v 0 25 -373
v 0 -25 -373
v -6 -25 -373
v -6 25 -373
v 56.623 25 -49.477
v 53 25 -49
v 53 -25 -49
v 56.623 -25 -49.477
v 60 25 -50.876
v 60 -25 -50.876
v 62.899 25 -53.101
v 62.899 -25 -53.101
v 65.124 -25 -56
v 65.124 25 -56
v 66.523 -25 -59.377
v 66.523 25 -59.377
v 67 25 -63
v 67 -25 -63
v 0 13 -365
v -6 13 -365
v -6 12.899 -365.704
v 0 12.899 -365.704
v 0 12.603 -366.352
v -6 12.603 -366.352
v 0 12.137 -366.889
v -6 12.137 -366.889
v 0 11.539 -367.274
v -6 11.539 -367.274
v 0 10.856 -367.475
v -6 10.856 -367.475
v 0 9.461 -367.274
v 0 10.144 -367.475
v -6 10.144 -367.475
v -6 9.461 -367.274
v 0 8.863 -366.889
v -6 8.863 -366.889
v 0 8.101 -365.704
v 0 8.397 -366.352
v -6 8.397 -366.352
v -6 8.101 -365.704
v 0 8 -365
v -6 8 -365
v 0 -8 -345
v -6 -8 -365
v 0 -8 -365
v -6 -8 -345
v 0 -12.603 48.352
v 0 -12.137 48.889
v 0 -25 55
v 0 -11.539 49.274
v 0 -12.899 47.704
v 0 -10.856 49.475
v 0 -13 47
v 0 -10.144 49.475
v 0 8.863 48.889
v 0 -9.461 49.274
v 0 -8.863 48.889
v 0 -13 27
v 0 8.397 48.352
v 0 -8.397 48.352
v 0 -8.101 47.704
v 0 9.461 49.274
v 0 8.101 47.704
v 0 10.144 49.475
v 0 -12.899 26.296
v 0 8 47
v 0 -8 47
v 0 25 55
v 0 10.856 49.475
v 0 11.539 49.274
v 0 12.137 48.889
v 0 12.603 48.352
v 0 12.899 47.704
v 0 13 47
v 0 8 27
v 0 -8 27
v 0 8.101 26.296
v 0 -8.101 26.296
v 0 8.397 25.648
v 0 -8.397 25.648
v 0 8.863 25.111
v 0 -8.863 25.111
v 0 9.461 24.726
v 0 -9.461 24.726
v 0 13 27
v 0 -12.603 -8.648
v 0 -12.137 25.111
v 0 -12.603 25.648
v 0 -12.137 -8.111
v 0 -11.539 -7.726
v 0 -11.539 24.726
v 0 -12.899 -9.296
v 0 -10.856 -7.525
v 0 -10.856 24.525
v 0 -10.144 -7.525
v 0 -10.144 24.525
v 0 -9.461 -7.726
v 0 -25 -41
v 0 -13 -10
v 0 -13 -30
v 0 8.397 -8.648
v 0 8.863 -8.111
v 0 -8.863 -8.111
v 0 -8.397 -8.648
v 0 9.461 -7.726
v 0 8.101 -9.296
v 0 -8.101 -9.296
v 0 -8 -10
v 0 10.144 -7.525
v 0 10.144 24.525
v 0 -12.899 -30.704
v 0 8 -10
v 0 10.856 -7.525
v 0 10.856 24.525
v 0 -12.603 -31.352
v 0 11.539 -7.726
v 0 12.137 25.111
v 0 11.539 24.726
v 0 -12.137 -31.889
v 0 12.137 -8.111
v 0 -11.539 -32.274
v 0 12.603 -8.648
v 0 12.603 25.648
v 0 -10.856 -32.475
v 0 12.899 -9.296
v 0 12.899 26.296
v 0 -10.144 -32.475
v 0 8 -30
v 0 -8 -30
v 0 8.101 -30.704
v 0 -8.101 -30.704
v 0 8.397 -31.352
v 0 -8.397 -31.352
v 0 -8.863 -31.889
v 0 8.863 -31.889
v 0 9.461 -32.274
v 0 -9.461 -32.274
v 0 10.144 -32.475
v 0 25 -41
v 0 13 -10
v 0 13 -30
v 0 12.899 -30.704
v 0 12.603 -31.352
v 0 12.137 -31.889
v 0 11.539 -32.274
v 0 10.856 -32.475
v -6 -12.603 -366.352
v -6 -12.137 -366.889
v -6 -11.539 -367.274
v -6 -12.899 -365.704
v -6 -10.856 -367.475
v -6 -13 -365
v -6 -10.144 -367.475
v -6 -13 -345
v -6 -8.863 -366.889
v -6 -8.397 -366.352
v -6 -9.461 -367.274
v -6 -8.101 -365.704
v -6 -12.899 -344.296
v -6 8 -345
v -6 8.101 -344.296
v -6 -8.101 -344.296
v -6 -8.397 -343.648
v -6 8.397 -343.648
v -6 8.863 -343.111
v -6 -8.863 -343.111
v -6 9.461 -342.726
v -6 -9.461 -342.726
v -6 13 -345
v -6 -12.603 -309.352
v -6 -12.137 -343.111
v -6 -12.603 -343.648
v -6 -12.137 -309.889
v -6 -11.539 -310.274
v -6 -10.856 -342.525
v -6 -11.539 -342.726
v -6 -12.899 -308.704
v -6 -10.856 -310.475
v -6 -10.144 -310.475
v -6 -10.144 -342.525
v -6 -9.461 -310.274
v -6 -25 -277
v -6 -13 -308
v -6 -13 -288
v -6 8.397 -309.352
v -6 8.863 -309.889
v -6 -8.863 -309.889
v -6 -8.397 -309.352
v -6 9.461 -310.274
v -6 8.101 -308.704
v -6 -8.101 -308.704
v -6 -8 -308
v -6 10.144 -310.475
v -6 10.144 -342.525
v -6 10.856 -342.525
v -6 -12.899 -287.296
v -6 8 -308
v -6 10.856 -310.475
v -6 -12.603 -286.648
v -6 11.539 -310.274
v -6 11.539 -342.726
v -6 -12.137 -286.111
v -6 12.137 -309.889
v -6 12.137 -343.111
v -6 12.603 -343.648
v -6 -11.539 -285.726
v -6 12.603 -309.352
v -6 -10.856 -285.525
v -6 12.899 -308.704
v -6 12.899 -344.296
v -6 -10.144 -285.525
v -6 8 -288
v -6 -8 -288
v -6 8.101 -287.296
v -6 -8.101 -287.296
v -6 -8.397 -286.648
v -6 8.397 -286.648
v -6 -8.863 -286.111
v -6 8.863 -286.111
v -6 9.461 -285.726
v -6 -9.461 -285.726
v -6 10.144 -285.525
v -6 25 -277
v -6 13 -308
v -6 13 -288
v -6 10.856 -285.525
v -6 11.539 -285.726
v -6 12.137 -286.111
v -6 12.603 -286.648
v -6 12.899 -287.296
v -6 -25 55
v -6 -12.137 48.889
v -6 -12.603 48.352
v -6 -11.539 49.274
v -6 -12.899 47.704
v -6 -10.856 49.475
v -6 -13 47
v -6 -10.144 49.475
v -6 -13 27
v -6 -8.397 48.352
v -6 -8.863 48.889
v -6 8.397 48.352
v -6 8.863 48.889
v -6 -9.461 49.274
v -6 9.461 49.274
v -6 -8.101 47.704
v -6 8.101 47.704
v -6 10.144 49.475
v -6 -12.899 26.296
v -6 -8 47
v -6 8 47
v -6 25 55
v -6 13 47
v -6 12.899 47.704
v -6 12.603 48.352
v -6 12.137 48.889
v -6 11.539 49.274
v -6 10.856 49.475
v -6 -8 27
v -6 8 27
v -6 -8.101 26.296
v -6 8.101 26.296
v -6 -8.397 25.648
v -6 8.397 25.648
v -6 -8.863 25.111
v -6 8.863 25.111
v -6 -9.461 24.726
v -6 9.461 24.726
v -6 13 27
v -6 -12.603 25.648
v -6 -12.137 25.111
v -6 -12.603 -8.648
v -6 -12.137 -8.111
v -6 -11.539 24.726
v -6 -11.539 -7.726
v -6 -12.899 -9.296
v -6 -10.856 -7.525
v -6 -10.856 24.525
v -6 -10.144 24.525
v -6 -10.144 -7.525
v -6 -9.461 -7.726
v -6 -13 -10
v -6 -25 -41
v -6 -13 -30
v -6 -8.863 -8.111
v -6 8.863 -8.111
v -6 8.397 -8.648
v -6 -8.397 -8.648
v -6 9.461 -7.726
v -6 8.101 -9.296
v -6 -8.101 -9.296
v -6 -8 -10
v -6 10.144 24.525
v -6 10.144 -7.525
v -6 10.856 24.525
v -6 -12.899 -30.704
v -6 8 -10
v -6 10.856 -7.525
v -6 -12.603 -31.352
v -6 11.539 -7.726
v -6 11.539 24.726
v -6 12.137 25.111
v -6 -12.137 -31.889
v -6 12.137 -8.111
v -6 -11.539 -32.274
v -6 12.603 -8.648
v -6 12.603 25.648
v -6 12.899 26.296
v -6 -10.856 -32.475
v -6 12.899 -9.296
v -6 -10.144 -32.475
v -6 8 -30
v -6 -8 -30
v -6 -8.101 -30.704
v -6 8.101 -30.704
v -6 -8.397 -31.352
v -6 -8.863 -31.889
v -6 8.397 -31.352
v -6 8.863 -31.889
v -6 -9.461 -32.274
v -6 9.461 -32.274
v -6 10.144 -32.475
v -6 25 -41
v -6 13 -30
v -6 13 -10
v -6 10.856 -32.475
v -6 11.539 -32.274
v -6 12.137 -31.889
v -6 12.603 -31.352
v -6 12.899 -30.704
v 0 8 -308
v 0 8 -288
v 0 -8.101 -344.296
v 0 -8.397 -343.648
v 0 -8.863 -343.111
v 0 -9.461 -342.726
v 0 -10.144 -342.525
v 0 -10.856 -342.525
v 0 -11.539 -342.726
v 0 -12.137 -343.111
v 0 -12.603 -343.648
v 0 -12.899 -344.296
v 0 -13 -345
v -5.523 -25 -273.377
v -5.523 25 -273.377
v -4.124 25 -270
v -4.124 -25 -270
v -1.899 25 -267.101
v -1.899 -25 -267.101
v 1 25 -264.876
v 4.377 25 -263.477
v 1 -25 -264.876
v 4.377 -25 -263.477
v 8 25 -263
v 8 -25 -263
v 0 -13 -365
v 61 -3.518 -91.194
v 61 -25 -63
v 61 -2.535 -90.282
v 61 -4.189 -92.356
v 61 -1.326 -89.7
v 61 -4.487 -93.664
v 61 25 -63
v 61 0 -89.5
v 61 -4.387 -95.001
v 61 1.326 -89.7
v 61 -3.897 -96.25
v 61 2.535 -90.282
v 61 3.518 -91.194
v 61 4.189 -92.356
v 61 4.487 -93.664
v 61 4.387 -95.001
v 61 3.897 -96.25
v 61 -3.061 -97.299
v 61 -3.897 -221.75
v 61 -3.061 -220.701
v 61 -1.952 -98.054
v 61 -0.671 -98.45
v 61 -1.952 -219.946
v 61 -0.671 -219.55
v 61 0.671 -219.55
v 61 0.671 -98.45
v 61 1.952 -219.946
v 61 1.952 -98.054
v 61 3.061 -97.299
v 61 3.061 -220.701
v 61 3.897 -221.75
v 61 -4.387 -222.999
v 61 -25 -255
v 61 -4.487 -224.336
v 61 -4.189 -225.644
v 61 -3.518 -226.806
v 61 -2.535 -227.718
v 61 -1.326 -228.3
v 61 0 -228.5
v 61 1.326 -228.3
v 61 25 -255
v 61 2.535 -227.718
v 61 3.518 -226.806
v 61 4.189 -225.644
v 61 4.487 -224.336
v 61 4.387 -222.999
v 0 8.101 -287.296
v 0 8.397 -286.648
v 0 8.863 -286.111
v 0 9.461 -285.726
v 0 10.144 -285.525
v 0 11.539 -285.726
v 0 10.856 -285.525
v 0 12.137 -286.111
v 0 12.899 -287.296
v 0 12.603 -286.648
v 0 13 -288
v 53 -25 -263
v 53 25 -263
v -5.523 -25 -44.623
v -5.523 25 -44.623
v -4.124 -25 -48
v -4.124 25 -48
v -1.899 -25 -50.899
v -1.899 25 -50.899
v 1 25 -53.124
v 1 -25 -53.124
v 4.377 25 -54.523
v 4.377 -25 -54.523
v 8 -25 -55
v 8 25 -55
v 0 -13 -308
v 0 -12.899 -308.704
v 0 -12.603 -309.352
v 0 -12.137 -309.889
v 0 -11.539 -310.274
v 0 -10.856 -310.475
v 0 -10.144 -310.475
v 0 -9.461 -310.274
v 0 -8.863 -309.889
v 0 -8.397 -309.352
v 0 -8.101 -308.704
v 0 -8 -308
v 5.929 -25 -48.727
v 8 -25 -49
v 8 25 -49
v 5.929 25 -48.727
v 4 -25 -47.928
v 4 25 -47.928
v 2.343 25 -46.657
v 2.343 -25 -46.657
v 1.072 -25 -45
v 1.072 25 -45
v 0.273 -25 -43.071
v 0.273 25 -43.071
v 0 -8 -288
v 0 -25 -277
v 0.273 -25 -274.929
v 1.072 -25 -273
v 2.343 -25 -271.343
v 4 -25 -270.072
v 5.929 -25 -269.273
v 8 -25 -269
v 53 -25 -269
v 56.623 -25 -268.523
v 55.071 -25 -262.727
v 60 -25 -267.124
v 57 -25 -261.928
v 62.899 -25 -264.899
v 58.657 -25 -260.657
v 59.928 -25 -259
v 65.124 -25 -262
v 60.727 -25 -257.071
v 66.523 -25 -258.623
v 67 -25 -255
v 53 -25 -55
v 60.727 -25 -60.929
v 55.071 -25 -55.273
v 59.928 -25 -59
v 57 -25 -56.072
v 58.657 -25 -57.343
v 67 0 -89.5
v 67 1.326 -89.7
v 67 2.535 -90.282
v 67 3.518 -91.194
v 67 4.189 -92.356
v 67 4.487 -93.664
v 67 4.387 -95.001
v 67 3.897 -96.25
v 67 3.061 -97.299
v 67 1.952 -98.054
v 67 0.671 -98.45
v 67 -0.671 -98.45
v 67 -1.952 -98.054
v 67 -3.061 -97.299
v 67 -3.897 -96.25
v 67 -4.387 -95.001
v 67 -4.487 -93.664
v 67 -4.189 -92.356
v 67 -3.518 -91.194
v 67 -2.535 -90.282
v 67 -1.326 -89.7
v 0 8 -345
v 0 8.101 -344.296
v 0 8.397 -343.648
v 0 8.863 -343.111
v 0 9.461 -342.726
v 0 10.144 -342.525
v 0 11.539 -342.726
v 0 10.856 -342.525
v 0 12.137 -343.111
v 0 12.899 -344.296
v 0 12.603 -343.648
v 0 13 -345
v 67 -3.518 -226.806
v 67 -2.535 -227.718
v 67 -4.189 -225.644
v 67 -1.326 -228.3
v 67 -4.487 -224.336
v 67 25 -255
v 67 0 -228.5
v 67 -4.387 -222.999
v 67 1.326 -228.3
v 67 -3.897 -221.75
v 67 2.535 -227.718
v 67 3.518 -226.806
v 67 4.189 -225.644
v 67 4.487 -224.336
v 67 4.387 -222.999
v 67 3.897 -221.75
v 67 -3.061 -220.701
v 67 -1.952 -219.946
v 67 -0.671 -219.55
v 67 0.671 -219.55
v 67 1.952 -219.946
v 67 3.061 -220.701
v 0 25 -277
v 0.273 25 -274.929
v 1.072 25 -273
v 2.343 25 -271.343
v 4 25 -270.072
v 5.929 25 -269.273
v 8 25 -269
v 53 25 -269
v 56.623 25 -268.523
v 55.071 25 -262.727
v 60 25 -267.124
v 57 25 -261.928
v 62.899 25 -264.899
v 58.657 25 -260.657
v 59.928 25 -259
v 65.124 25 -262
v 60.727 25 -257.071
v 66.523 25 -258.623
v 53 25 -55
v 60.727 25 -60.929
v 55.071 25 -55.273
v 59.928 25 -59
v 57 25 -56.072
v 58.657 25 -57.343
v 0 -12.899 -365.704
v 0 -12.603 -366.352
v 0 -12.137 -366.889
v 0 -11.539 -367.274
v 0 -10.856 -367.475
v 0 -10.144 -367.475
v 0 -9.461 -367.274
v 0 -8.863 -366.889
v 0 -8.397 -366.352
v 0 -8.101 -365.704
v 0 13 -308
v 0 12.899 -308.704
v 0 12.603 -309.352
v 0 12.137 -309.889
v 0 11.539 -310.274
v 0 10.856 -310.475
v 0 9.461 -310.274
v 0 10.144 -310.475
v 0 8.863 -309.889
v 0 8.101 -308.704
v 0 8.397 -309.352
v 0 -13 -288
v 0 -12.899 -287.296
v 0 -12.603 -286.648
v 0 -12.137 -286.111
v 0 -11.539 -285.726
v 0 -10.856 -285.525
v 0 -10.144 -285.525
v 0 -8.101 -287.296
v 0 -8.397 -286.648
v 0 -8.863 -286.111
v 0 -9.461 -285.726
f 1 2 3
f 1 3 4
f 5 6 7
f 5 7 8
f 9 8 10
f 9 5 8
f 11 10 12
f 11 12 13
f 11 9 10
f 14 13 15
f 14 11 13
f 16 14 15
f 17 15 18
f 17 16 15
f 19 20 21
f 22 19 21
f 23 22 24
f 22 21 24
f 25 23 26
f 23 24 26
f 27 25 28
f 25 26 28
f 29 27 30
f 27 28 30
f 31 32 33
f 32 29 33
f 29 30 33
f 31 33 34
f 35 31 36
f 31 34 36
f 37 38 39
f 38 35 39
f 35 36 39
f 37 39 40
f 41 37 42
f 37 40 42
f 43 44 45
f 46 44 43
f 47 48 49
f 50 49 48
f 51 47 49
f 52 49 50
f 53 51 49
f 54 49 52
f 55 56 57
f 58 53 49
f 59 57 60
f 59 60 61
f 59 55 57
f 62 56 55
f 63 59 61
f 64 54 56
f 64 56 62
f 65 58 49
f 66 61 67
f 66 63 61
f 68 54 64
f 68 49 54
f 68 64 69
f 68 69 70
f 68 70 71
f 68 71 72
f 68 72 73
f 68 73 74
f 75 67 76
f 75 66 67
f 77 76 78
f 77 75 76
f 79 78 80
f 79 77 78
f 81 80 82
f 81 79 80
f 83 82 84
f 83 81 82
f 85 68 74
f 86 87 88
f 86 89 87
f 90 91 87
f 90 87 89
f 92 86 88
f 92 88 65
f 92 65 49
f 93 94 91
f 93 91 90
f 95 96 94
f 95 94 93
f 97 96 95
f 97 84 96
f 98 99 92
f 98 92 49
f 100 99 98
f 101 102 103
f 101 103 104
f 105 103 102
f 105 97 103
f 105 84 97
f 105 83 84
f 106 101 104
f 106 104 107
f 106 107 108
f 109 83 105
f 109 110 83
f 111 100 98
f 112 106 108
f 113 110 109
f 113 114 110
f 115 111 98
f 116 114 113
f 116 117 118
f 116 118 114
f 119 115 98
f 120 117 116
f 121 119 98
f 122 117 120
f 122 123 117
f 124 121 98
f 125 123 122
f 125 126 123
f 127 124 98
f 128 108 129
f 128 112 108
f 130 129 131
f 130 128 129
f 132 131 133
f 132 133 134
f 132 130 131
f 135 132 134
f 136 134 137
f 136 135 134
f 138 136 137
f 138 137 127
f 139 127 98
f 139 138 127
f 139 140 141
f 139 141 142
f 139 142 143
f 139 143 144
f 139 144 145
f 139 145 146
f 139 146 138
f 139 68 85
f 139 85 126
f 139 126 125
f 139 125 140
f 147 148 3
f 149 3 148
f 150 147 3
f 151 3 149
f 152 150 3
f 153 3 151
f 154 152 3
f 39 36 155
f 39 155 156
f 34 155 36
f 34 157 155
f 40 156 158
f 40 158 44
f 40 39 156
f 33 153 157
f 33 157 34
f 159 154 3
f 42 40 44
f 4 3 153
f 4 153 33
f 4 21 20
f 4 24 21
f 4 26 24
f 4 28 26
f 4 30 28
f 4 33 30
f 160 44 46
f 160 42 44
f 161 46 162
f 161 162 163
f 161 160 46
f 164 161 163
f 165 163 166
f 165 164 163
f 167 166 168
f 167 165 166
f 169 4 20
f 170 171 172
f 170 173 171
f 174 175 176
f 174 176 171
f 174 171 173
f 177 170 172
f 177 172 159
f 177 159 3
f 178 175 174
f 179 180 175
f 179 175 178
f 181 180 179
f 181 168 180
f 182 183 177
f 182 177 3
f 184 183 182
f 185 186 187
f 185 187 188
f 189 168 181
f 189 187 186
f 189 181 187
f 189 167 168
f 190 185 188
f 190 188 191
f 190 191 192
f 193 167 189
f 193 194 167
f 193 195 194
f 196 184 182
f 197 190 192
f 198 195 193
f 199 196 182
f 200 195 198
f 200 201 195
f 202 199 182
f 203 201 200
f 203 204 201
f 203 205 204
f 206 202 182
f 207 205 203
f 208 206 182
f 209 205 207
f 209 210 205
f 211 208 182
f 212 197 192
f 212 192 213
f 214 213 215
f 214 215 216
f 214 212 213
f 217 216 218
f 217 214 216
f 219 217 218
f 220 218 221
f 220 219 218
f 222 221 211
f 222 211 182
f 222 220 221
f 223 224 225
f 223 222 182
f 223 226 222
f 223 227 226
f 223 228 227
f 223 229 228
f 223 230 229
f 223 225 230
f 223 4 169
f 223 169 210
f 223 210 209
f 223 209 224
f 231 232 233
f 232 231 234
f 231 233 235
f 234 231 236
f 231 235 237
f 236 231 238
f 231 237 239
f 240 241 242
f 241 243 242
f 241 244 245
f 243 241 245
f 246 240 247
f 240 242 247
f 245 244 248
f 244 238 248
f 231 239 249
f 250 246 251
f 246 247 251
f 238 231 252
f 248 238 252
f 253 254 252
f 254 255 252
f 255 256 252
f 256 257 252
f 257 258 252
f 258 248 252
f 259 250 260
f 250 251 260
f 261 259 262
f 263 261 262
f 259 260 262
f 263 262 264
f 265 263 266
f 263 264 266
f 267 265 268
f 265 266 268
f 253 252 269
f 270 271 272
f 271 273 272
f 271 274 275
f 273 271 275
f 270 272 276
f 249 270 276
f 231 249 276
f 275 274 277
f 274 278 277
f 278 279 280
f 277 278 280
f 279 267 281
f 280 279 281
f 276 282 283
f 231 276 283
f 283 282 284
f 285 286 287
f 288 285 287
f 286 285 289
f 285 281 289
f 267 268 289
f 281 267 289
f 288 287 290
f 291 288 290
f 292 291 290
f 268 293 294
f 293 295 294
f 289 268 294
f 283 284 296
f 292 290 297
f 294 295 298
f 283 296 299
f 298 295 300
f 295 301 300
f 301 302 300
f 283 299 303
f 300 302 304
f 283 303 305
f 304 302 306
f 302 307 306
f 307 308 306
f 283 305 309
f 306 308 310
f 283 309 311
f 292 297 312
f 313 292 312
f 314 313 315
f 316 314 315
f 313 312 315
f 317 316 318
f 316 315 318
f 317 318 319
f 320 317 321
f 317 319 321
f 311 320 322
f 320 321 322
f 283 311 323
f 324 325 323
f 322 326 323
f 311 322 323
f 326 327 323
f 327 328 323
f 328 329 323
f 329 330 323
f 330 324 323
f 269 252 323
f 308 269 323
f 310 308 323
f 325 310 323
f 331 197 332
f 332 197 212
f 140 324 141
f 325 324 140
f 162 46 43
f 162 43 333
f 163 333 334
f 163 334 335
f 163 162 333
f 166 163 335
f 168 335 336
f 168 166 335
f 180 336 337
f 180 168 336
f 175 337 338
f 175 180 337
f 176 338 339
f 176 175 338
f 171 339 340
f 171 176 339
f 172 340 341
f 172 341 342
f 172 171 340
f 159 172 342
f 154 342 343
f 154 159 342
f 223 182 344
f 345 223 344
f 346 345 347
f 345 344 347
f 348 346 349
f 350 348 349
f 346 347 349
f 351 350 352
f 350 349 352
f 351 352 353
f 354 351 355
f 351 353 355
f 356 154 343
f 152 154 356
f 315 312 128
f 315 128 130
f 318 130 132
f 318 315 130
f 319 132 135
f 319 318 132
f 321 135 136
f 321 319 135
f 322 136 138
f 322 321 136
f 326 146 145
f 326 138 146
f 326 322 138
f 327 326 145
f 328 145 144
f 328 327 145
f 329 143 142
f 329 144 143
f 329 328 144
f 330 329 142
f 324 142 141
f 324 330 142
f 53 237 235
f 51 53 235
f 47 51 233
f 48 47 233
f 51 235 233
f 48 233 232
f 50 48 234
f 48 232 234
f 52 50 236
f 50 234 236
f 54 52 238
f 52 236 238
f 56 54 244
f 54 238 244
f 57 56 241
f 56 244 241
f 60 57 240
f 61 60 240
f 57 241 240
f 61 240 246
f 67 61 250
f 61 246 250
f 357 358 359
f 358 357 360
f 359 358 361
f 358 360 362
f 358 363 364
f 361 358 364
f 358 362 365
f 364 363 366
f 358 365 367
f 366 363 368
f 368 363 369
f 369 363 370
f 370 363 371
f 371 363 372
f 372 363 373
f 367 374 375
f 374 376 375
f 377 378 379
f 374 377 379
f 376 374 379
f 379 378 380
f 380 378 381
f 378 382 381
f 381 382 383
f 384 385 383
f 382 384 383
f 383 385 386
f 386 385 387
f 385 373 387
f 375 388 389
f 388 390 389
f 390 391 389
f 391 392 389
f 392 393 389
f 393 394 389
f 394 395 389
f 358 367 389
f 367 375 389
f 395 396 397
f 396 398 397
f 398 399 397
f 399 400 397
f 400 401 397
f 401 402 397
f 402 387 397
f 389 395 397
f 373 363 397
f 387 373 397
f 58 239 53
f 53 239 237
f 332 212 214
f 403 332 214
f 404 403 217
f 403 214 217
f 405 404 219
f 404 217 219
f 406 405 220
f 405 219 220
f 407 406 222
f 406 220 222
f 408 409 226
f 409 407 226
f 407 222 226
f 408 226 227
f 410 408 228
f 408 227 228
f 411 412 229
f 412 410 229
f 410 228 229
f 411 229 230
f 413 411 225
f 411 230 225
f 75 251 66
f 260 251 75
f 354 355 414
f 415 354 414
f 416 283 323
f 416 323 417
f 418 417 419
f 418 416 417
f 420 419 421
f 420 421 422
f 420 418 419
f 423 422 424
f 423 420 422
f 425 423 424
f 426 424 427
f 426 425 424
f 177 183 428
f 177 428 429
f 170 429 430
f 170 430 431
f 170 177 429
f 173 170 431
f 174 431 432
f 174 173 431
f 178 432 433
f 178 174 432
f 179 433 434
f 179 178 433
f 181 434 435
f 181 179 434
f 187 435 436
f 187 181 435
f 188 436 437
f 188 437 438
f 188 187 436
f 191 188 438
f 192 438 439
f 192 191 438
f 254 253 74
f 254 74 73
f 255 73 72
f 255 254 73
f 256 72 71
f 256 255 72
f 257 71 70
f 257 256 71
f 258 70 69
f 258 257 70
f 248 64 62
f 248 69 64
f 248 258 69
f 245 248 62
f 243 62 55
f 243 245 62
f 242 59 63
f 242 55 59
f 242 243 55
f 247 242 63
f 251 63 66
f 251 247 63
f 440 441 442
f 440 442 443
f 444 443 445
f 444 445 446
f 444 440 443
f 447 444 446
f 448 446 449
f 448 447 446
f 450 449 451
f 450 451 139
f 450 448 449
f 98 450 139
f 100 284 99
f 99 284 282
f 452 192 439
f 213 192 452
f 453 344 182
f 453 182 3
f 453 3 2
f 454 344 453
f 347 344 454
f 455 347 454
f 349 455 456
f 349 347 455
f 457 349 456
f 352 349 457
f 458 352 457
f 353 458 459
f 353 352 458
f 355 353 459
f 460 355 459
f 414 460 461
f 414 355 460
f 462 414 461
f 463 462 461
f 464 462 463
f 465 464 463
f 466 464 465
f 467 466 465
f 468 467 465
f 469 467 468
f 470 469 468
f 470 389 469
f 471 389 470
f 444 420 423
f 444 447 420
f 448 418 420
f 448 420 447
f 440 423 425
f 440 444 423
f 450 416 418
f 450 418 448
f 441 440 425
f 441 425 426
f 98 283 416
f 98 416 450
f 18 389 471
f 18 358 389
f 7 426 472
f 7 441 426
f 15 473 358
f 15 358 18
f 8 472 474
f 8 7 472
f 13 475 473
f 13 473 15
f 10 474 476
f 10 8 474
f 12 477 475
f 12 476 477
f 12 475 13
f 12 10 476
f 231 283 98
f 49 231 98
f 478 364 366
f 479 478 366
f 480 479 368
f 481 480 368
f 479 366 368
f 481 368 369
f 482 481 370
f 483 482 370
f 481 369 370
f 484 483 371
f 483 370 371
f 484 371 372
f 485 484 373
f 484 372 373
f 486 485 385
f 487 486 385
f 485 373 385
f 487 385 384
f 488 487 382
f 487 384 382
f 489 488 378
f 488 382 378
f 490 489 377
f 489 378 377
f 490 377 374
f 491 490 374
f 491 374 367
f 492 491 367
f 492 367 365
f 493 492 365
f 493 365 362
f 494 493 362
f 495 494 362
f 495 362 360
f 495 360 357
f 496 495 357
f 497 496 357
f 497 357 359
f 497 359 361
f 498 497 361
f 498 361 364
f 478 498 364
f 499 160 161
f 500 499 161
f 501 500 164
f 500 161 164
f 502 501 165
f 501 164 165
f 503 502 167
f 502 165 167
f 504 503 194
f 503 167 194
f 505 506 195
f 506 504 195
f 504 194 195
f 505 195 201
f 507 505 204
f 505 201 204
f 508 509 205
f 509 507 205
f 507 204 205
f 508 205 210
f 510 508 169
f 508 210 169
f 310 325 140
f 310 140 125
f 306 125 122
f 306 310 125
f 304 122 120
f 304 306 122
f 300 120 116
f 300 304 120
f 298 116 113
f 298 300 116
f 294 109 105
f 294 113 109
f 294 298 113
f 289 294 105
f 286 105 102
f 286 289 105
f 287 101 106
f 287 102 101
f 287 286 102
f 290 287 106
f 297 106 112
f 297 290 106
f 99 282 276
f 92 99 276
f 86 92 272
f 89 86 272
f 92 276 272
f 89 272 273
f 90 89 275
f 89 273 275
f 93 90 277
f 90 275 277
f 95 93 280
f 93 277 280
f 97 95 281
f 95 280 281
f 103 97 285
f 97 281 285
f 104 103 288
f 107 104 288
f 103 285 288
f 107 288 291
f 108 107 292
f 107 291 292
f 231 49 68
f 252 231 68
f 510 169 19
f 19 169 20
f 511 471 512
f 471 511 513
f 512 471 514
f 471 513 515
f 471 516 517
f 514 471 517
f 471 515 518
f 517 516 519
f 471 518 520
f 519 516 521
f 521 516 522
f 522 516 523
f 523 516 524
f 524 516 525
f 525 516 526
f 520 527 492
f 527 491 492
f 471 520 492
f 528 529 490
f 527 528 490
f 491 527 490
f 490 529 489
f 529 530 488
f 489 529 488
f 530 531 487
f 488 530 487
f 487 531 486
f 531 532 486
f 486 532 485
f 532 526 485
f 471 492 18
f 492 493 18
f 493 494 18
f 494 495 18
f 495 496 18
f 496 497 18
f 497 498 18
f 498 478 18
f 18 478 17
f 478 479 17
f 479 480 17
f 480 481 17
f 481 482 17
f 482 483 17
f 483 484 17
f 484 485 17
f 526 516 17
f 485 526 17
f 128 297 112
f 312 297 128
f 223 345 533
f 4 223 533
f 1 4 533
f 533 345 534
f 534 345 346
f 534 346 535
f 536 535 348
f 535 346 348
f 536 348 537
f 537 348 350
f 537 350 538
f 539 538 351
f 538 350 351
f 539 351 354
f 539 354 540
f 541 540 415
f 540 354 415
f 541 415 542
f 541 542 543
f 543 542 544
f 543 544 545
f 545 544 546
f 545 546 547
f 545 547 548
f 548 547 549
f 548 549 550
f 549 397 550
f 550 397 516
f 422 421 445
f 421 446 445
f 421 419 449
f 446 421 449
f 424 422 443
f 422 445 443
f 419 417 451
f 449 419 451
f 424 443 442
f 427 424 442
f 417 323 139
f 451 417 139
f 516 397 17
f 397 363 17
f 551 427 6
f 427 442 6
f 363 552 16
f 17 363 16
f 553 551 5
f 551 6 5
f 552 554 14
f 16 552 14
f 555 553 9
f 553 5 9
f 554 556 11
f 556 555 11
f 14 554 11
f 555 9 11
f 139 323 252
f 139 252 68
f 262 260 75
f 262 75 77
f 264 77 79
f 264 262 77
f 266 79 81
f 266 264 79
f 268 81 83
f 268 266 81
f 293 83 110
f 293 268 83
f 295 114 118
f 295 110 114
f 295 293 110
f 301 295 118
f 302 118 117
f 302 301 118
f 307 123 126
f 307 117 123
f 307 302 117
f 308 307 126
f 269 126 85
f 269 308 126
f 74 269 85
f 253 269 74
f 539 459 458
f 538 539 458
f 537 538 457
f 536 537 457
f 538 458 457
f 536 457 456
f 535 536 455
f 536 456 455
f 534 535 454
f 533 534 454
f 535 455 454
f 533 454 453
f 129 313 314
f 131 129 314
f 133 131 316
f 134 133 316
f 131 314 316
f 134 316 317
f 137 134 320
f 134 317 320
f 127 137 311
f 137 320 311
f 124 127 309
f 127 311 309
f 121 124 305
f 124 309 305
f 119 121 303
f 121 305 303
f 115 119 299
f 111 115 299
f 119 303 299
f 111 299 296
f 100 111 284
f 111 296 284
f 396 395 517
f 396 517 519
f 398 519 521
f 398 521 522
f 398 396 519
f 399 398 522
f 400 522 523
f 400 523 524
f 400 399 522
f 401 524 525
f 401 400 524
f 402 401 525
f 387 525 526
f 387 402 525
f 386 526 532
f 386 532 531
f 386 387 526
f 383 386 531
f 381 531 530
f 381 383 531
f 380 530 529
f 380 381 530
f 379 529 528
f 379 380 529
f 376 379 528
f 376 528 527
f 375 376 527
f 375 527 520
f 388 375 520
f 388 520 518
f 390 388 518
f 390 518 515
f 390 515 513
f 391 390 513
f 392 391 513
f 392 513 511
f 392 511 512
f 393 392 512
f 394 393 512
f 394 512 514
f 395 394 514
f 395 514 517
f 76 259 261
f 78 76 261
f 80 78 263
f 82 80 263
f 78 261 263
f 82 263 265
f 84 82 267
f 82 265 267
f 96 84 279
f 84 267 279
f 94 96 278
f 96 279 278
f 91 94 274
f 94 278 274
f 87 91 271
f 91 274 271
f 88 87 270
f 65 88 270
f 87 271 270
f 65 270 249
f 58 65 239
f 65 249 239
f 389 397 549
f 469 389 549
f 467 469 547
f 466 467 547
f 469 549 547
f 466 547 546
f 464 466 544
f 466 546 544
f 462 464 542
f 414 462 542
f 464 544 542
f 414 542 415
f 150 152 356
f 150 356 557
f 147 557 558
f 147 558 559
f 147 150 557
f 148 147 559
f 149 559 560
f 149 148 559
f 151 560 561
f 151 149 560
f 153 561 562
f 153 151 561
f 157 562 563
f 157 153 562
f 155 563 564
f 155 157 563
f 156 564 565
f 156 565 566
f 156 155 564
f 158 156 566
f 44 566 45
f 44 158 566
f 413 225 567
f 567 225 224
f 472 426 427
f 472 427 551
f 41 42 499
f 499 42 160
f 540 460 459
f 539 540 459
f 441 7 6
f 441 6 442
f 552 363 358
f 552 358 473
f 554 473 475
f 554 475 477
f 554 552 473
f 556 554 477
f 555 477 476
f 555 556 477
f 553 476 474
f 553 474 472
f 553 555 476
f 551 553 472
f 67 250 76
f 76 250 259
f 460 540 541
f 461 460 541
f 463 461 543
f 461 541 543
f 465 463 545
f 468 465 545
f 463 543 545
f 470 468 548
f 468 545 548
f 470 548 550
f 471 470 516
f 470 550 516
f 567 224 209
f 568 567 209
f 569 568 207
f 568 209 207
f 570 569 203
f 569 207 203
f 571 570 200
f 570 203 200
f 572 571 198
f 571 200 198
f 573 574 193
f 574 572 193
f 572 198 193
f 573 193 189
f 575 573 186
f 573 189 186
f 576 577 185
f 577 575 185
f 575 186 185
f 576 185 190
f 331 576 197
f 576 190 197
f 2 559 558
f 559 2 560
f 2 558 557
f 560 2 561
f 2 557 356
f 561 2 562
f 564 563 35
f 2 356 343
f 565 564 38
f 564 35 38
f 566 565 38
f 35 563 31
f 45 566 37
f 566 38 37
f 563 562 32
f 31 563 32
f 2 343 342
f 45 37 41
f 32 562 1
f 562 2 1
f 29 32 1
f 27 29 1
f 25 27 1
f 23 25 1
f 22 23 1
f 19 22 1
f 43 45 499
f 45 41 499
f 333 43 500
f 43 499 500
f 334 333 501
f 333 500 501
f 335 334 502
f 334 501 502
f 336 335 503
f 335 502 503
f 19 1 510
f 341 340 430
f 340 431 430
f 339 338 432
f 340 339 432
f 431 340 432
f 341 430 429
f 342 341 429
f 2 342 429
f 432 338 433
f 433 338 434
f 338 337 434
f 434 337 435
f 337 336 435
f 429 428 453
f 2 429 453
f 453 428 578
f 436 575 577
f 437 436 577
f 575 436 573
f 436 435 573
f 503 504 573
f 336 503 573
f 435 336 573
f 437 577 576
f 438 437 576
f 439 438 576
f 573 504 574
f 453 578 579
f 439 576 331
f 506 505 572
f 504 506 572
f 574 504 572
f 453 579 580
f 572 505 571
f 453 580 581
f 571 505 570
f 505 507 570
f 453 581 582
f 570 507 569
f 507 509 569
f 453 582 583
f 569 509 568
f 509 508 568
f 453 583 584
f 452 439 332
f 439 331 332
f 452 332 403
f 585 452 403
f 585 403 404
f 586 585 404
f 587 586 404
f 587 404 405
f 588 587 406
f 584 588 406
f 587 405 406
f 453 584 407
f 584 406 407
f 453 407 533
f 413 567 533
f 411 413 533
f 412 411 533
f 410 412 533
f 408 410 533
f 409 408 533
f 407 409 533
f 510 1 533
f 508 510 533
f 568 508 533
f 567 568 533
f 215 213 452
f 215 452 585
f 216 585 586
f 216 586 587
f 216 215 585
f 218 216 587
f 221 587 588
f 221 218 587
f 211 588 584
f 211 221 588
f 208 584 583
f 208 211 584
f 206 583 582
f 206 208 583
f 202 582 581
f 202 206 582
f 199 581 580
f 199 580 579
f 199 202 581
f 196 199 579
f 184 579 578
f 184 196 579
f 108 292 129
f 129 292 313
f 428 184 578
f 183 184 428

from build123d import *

# Parameters (mm, degrees)
SKETCH1_W                    = 110
SKETCH1_H                    = 50
BASE_FLANGE1_DEPTH           = 6
CUT_EXTRUDE1_DEPTH           = 10
LPATTERN1_COUNT              = 2
LPATTERN1_PITCH              = 57
MIRROR1_COPY_1_DEPTH         = 10
EDGE_FLANGE1_STRIP_W         = 40
EDGE_FLANGE1_STRIP_H         = 6
EDGE_FLANGE1_STRIP_CUT_DEPTH = 50
EDGE_FLANGE1_DEPTH           = 50
EDGE_FLANGE2_STRIP_W         = 40
EDGE_FLANGE2_STRIP_H         = 6
EDGE_FLANGE2_STRIP_CUT_DEPTH = 50
EDGE_FLANGE2_DEPTH           = 50
SKETCH9_R                    = 4.5
CUT_EXTRUDE2_DEPTH           = 10


# Sheet-metal steps are written as plain solids
with BuildPart() as part:
    # Sketch1 → Base-Flange1 (new body)
    with BuildSketch(Plane(origin=(0, 0, 0), x_dir=(0, 0, -1), z_dir=(1, 0, 0))):
        Rectangle(SKETCH1_W, SKETCH1_H)
    extrude(amount=-BASE_FLANGE1_DEPTH)

    # Sketch5 → Cut-Extrude1 (cut)
    with BuildSketch(Plane.ZY.offset(6)):
        with BuildLine():
            Line((-30, 13), (-10, 13))
            ThreePointArc((-10, 13), (-7.5, 10.5), (-10, 8))
            Line((-10, 8), (-30, 8))
            ThreePointArc((-30, 8), (-32.5, 10.5), (-30, 13))
        make_face()
    cut_extrude1 = extrude(amount=-CUT_EXTRUDE1_DEPTH, mode=Mode.SUBTRACT)

    # LPattern1: Cut-Extrude1 ×2
    with Locations(*[(0, 0, i * LPATTERN1_PITCH) for i in range(1, LPATTERN1_COUNT)]):
        add(cut_extrude1, mode=Mode.SUBTRACT)

    # Mirror1: Cut-Extrude1 across plane
    add(cut_extrude1.mirror(Plane.ZX), mode=Mode.SUBTRACT)

    # Mirror1 copy 1 sketch → Mirror1 copy 1 (cut)
    with BuildSketch(Plane(origin=(-6, 0, 57), x_dir=(0, 0, 1), z_dir=(-1, 0, 0))):
        with BuildLine():
            Line((-30, -13), (-10, -13))
            ThreePointArc((-10, -13), (-7.5, -10.5), (-10, -8))
            Line((-10, -8), (-30, -8))
            ThreePointArc((-30, -8), (-32.5, -10.5), (-30, -13))
        make_face()
    extrude(amount=-MIRROR1_COPY_1_DEPTH, mode=Mode.SUBTRACT)

    # Edge-Flange1 strip (across the edge) → Edge-Flange1 strip cut (cut)
    with BuildSketch(Plane(origin=(0, -25, -55), x_dir=(0, 0, 1), z_dir=(0, 1, 0))):
        with Locations((-6, -3)):
            Rectangle(EDGE_FLANGE1_STRIP_W, EDGE_FLANGE1_STRIP_H)
    extrude(amount=EDGE_FLANGE1_STRIP_CUT_DEPTH, mode=Mode.SUBTRACT)

    # Edge-Flange1 section (across the edge) → Edge-Flange1 (add)
    with BuildSketch(Plane(origin=(0, -25, -55), x_dir=(0, 0, 1), z_dir=(0, 1, 0))):
        with BuildLine():
            Line((0, 8), (0, 67))
            Line((0, 67), (6, 67))
            Line((6, 67), (6, 8))
            ThreePointArc((6, 8), (8.343145751, 2.343145751), (14, 0))
            Line((14, 0), (14, -6))
            ThreePointArc((14, -6), (4.100505063, -1.899494937), (0, 8))
        make_face()
    extrude(amount=EDGE_FLANGE1_DEPTH)

    # Edge-Flange2 strip (across the edge) → Edge-Flange2 strip cut (cut)
    with BuildSketch(Plane(origin=(67, 25, -55), x_dir=(-1, 0, 0), z_dir=(0, -1, 0))):
        with Locations((-6, -3)):
            Rectangle(EDGE_FLANGE2_STRIP_W, EDGE_FLANGE2_STRIP_H)
    extrude(amount=EDGE_FLANGE2_STRIP_CUT_DEPTH, mode=Mode.SUBTRACT)

    # Edge-Flange2 section (across the edge) → Edge-Flange2 (add)
    with BuildSketch(Plane(origin=(67, 25, -55), x_dir=(-1, 0, 0), z_dir=(0, -1, 0))):
        with BuildLine():
            Line((0, 8), (0, 104))
            Line((0, 104), (6, 104))
            Line((6, 104), (6, 8))
            ThreePointArc((6, 8), (8.343145751, 2.343145751), (14, 0))
            Line((14, 0), (14, -6))
            ThreePointArc((14, -6), (4.100505063, -1.899494937), (0, 8))
        make_face()
    extrude(amount=EDGE_FLANGE2_DEPTH)

    # Sketch9 → Cut-Extrude2 (cut)
    with BuildSketch(Plane.ZY.offset(-61)):
        with Locations((-94, 0)):
            Circle(SKETCH9_R)
    extrude(amount=-CUT_EXTRUDE2_DEPTH, mode=Mode.SUBTRACT)

    # Mirror2: part across plane


with BuildPart() as part_1:
    add(part.part)
    add(part.part.mirror(Plane(origin=(67, 25, -159), x_dir=(1, 0, 0), z_dir=(0, 0, 1))))


solid = part_1.part
